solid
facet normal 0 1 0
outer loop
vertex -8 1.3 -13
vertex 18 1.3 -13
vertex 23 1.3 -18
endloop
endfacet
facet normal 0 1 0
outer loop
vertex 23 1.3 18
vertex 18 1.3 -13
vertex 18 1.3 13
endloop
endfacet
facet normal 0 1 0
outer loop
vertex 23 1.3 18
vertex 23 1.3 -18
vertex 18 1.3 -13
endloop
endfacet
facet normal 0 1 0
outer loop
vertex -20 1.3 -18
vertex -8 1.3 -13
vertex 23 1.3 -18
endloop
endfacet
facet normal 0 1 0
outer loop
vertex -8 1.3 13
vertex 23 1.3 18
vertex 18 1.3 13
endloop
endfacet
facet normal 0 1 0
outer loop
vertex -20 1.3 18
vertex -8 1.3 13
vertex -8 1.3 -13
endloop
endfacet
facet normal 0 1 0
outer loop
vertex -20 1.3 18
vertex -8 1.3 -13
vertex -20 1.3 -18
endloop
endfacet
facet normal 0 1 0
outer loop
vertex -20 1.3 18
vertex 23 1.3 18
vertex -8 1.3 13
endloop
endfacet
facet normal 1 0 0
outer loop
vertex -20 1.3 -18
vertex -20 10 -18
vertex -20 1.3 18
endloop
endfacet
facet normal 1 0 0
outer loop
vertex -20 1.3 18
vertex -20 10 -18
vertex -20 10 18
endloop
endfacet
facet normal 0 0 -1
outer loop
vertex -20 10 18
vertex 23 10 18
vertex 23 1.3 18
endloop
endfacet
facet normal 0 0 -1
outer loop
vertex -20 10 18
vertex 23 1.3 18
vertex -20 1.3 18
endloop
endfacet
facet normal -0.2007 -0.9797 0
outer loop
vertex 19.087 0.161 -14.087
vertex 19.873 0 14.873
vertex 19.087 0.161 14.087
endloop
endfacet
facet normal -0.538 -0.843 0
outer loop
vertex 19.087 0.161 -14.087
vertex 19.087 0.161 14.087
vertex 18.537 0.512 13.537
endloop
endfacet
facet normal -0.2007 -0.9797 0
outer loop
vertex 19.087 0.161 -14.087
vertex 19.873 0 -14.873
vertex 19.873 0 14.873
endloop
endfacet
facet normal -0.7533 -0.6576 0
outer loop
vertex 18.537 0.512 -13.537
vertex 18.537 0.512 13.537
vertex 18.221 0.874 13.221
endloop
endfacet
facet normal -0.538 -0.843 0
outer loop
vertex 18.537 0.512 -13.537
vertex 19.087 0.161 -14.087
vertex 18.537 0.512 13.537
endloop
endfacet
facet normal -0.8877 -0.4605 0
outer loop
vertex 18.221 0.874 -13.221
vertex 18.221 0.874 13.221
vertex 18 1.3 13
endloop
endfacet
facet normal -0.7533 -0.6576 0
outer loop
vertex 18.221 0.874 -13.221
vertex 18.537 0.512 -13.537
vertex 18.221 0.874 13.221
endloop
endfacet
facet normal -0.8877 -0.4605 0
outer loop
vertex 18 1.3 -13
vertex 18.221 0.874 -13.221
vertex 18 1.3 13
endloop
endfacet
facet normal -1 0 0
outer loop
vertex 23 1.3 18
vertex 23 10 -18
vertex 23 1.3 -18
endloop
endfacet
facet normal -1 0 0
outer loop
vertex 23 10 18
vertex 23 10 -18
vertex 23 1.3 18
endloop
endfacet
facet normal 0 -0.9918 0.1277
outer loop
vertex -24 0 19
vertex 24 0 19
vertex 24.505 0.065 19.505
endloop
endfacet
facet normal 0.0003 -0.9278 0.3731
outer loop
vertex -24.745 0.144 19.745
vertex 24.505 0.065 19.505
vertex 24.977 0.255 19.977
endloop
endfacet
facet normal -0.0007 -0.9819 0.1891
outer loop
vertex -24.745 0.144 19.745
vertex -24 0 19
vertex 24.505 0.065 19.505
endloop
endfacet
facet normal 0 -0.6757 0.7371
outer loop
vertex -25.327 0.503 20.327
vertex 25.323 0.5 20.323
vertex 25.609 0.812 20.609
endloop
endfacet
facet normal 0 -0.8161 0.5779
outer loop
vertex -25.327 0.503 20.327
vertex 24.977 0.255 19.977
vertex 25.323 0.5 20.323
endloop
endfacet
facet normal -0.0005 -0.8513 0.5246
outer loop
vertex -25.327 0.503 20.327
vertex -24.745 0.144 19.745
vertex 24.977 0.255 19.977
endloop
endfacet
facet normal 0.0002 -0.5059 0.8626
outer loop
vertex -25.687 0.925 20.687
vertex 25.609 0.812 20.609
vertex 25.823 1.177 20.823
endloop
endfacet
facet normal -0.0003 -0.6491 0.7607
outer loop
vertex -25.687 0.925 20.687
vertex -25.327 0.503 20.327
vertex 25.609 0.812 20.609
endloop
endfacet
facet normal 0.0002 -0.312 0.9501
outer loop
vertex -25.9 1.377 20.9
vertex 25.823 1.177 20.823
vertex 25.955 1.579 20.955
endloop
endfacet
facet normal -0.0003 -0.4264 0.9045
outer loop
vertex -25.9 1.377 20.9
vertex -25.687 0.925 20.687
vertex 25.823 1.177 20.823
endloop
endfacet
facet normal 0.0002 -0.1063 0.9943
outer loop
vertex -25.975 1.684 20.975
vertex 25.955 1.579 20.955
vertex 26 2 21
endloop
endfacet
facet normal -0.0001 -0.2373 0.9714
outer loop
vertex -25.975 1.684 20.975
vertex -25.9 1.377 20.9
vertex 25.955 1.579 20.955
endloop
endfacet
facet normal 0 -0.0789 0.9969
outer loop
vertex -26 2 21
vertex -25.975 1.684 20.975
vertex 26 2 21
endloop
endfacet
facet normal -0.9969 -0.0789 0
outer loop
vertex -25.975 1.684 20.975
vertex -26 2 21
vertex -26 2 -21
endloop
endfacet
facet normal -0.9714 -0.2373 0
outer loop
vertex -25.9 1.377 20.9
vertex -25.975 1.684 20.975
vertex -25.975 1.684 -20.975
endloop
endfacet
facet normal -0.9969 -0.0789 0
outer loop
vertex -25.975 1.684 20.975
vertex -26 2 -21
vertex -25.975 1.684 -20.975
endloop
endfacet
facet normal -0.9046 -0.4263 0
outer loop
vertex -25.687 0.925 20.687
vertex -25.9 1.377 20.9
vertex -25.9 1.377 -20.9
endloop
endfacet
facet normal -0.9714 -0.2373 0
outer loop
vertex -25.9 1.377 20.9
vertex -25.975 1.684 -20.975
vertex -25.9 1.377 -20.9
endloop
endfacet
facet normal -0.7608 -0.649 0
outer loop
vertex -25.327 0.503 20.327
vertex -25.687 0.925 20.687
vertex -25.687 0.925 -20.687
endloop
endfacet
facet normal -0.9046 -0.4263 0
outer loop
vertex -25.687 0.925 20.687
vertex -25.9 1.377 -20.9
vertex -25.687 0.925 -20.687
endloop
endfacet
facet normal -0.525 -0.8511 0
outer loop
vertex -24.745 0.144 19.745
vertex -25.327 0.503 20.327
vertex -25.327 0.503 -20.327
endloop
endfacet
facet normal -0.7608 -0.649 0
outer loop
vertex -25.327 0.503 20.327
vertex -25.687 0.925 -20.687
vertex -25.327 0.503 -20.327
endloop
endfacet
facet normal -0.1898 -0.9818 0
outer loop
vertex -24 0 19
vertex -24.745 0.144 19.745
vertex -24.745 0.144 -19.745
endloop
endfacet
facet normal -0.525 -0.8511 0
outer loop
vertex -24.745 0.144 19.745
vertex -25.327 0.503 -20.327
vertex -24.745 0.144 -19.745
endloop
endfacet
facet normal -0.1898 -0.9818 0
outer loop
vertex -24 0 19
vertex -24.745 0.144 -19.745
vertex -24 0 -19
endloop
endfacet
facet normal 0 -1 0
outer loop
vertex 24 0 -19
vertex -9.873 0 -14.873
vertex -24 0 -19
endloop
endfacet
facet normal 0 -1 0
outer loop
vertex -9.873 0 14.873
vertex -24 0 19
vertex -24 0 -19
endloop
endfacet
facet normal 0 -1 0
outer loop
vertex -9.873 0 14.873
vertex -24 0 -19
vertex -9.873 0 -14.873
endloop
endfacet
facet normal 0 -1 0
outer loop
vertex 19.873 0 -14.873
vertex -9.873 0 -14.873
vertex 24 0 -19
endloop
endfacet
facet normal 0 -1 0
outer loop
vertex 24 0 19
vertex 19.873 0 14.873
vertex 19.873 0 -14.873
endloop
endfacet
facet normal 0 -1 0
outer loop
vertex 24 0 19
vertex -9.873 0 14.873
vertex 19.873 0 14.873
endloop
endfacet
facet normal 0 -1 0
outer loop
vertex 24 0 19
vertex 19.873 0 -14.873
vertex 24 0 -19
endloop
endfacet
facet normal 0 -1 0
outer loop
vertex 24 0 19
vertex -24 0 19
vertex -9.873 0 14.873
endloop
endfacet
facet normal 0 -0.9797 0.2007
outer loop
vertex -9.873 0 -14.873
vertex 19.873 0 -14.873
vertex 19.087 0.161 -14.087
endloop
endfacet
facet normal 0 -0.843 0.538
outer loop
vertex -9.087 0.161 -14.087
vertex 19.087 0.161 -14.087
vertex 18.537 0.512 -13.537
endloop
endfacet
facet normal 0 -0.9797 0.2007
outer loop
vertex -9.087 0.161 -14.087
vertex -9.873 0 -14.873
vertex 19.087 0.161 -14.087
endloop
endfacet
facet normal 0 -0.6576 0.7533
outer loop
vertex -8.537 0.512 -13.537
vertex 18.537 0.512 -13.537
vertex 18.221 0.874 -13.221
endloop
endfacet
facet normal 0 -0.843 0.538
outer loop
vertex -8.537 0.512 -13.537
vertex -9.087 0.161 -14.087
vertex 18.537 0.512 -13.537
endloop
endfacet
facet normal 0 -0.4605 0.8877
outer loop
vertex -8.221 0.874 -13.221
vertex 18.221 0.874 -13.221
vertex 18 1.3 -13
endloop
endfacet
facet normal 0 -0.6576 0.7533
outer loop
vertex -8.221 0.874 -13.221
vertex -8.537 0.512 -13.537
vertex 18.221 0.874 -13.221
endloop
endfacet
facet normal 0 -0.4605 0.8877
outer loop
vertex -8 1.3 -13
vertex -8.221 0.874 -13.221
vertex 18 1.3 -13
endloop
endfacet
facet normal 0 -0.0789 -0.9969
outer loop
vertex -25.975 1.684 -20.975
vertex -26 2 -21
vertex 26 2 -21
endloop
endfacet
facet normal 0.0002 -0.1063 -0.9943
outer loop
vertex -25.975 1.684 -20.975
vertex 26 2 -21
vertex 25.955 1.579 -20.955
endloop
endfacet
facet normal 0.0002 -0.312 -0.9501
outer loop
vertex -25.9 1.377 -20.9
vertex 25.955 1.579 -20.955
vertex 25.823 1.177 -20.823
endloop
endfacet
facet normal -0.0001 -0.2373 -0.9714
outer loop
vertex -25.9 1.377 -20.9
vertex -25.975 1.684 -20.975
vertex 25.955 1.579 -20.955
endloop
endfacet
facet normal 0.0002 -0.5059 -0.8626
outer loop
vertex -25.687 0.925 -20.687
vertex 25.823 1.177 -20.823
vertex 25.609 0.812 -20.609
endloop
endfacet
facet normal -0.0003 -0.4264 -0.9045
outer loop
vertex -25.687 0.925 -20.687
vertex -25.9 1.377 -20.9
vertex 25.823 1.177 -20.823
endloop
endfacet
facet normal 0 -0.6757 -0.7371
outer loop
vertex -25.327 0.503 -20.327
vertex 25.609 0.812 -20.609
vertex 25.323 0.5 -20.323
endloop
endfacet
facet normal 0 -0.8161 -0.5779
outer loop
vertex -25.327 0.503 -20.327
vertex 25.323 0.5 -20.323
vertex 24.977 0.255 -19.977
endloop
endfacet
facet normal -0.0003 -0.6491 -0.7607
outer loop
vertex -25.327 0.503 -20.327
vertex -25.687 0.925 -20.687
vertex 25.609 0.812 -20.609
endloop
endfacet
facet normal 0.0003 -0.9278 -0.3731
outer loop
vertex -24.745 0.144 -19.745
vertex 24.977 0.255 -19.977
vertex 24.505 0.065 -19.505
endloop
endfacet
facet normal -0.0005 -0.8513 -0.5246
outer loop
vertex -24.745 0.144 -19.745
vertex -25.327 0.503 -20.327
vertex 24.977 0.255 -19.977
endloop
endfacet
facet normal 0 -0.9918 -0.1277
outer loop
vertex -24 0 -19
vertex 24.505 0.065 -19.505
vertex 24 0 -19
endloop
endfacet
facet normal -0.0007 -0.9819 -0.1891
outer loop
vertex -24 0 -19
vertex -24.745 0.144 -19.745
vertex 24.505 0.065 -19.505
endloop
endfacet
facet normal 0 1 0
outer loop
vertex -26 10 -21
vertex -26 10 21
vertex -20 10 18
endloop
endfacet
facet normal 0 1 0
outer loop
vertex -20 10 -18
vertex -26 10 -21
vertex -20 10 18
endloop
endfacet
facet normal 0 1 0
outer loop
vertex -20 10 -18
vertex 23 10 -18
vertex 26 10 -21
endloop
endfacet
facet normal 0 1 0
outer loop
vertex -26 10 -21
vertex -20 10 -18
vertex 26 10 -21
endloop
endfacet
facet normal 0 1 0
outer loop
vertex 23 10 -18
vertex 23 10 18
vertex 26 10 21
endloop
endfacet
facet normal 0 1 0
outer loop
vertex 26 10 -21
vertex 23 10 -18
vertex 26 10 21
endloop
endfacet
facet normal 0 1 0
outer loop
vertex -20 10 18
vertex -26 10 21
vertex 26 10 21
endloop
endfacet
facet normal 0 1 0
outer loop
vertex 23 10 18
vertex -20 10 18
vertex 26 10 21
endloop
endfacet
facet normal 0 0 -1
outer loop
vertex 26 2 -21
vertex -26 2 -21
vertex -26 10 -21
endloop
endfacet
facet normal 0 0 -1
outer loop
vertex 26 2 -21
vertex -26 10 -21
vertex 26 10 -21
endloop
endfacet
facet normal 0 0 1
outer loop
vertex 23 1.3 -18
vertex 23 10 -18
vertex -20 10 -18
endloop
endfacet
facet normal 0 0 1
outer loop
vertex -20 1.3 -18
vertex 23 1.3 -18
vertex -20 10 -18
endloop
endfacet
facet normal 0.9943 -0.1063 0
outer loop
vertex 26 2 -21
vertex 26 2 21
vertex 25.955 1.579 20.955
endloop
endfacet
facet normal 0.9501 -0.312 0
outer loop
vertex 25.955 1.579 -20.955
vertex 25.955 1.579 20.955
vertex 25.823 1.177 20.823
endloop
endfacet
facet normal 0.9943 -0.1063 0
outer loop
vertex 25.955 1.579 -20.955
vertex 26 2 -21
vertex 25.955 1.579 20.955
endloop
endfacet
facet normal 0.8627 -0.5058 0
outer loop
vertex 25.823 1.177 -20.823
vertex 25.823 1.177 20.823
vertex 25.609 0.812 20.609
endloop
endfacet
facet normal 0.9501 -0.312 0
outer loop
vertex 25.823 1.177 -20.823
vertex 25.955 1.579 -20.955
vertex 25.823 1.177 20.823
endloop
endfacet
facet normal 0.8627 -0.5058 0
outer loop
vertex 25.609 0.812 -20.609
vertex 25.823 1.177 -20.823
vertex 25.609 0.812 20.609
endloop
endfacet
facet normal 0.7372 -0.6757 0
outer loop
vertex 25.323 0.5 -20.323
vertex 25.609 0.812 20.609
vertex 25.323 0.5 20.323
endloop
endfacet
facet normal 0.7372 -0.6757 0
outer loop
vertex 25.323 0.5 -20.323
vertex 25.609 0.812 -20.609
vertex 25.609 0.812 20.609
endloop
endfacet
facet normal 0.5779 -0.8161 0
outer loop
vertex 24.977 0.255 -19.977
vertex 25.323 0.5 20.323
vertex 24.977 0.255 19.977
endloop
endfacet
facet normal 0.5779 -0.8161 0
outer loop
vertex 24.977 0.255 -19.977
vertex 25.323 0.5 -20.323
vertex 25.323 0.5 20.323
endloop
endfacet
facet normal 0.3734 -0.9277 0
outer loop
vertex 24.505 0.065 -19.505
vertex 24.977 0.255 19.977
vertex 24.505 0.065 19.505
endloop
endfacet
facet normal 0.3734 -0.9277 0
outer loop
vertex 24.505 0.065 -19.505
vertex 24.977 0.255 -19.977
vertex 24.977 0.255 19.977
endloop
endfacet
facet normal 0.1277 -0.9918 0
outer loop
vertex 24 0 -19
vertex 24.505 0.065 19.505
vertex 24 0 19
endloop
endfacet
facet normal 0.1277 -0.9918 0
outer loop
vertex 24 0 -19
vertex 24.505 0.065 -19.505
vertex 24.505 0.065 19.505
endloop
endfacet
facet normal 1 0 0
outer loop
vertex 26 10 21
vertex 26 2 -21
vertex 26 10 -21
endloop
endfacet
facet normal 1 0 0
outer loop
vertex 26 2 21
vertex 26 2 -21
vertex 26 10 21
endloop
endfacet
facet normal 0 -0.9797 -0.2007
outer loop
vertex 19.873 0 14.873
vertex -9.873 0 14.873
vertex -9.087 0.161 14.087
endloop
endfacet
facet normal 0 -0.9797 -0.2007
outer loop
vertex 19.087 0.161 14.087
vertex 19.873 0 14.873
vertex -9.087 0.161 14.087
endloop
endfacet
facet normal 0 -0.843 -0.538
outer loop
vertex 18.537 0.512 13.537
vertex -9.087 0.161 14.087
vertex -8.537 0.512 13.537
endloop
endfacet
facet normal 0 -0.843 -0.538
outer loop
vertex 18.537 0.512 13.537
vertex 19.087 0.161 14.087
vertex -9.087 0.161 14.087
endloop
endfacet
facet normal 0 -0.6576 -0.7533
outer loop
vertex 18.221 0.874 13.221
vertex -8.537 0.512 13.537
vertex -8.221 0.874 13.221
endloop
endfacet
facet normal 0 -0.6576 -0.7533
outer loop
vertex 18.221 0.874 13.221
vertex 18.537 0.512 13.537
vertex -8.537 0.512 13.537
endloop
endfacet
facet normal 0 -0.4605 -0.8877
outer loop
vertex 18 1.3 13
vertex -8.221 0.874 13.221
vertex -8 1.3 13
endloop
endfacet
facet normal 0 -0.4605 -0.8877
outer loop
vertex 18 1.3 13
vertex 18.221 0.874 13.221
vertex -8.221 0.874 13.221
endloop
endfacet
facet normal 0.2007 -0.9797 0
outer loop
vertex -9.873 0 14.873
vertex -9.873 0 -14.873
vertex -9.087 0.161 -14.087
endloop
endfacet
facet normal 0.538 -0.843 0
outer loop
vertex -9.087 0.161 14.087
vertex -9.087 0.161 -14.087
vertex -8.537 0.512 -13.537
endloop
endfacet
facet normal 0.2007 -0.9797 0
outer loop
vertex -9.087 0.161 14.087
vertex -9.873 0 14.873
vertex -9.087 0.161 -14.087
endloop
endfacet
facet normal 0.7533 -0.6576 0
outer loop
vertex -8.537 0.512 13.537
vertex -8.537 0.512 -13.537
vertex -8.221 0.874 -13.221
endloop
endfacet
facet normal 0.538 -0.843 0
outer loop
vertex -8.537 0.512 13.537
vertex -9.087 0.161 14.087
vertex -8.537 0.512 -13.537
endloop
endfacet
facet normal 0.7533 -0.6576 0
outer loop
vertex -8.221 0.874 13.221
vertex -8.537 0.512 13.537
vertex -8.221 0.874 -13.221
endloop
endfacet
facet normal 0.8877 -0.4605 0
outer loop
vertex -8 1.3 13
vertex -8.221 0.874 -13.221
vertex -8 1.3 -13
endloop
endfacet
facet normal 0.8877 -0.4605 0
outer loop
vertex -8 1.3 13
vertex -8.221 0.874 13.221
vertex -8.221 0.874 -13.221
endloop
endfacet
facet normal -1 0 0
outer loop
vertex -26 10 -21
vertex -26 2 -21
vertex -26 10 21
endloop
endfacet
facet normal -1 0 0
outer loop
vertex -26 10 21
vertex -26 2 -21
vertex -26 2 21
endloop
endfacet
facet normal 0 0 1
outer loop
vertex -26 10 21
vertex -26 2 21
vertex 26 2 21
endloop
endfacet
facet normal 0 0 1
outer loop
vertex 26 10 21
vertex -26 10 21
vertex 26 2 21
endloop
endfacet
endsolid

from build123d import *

# Parameters (mm, degrees)
F0_W         = 52
F0_H         = 42
F1_DEPTH     = 10
F2_W         = 26
F2_H         = 26
F3_DEPTH     = 25
F4_W         = 43
F4_H         = 36
F4_W_2       = 26
F4_H_2       = 26
F5_DEPTH     = 8.7
F6_T1_DEPTH  = 52
F6_T3_DEPTH  = 62
F6_T5_DEPTH  = 26
F6_T7_DEPTH  = 26
F6_T13_DEPTH = 30.6837484988
F6_T17_DEPTH = 30.6837484988
F6_T24_DEPTH = 30.6837484988
F6_T28_DEPTH = 30.6837484988
F6_T35_DEPTH = 30.6837484988
F6_T39_DEPTH = 30.6837484988
F6_T46_DEPTH = 30.6837484988
F6_T50_DEPTH = 30.6837484988


# Not quite as in the source:
# - a fillet or chamfer that OpenCascade refuses, or shapes differently, is made with other operations: its cross-section is extruded or revolved along the edge and cut away or added


with BuildPart() as f1:
    # F0 (on Front) → F1 (new body)
    with BuildSketch(Plane.XZ):
        Rectangle(F0_W, F0_H)
    extrude(amount=-F1_DEPTH)

    # F2 (on face) → F3 (cut)
    with BuildSketch(Plane.XZ):
        with Locations((5, 0)):
            Rectangle(F2_W, F2_H)
    extrude(amount=-F3_DEPTH, mode=Mode.SUBTRACT)

    # F4 (on face) → F5 (cut)
    with BuildSketch(Plane(origin=(0, 10, 0), x_dir=(-1, 0, 0), z_dir=(0, 1, 0))):
        with Locations((-1.5, 0)):
            Rectangle(F4_W, F4_H)
        with Locations((-5, 0)):
            Rectangle(F4_W_2, F4_H_2, mode=Mode.SUBTRACT)
    extrude(amount=-F5_DEPTH, mode=Mode.SUBTRACT)

    # F6: fillet of radius 2 on 8 edges, made by hand

    # F6_s2 → F6_t1 (cut)
    with BuildSketch(Plane.XY.offset(-26)):
        with BuildLine():
            ThreePointArc((-26, 2), (-25.4142135624, 0.5857864376), (-24, 0))
            Line((-24, 0), (-26, 0))
            Line((-26, 0), (-26, 2))
        make_face()
        with BuildLine():
            ThreePointArc((26, 2), (25.4142135624, 0.5857864376), (24, 0))
            Line((24, 0), (26, 0))
            Line((26, 0), (26, 2))
        make_face()
    extrude(amount=F6_T1_DEPTH, mode=Mode.SUBTRACT)

    # F6_s4 → F6_t3 (cut)
    with BuildSketch(Plane.YZ.offset(-31)):
        with BuildLine():
            ThreePointArc((0, 19), (0.5857864376, 20.4142135624), (2, 21))
            Line((2, 21), (0, 21))
            Line((0, 21), (0, 19))
        make_face()
        with BuildLine():
            ThreePointArc((2, -21), (0.5857864376, -20.4142135624), (0, -19))
            Line((0, -19), (0, -21))
            Line((0, -21), (2, -21))
        make_face()
    extrude(amount=F6_T3_DEPTH, mode=Mode.SUBTRACT)

    # F6_s6 → F6_t5 (cut)
    with BuildSketch(Plane.XY.offset(-13)):
        with BuildLine():
            ThreePointArc((-9.8734993995, 0), (-8.7333239744, 0.3568323275), (-8, 1.3))
            Line((-8, 1.3), (-8, 0))
            Line((-8, 0), (-9.8734993995, 0))
        make_face()
        with BuildLine():
            ThreePointArc((19.8734993995, 0), (18.7333239744, 0.3568323275), (18, 1.3))
            Line((18, 1.3), (18, 0))
            Line((18, 0), (19.8734993995, 0))
        make_face()
    extrude(amount=F6_T5_DEPTH, mode=Mode.SUBTRACT)

    # F6_s8 → F6_t7 (cut)
    with BuildSketch(Plane.YZ.offset(-8)):
        with BuildLine():
            ThreePointArc((0, -14.8734993995), (0.3568323275, -13.7333239744), (1.3, -13))
            Line((1.3, -13), (0, -13))
            Line((0, -13), (0, -14.8734993995))
        make_face()
        with BuildLine():
            ThreePointArc((0, 14.8734993995), (0.3568323275, 13.7333239744), (1.3, 13))
            Line((1.3, 13), (0, 13))
            Line((0, 13), (0, 14.8734993995))
        make_face()
    extrude(amount=F6_T7_DEPTH, mode=Mode.SUBTRACT)


with BuildPart() as f6_tool11:
    # F6_s12 → F6_t13 (new body)
    with BuildSketch(Plane.YZ.offset(18)):
        with BuildLine():
            ThreePointArc((0, 14.8734993995), (0.3568323275, 13.7333239744), (1.3, 13))
            Line((1.3, 13), (0, 13))
            Line((0, 13), (0, 14.8734993995))
        make_face()
    extrude(amount=-F6_T13_DEPTH)

    split(bisect_by=Plane.YZ.offset(-8), keep=Keep.BOTTOM)


with BuildPart() as f6_tool15:
    # F6_s16 → F6_t17 (new body)
    with BuildSketch(Plane.XY.offset(17.6837484988)):
        with BuildLine():
            ThreePointArc((-9.8734993995, 0), (-8.7333239744, 0.3568323275), (-8, 1.3))
            Line((-8, 1.3), (-8, 0))
            Line((-8, 0), (-9.8734993995, 0))
        make_face()
    extrude(amount=-F6_T17_DEPTH)

    split(bisect_by=Plane.XY.offset(13), keep=Keep.TOP)


with BuildPart() as f6_tool11_1:
    add(f6_tool11.part)

    # F6_t19: intersect F6_tool15
    add(f6_tool15.part, mode=Mode.INTERSECT)


with BuildPart() as f1_1:
    add(f1.part)

    # F6_t9: cut F6_tool11
    add(f6_tool11_1.part, mode=Mode.SUBTRACT)


with BuildPart() as f6_tool22:
    # F6_s23 → F6_t24 (new body)
    with BuildSketch(Plane.XY.offset(13)):
        with BuildLine():
            ThreePointArc((-9.8734993995, 0), (-8.7333239744, 0.3568323275), (-8, 1.3))
            Line((-8, 1.3), (-8, 0))
            Line((-8, 0), (-9.8734993995, 0))
        make_face()
    extrude(amount=-F6_T24_DEPTH)

    split(bisect_by=Plane.XY.offset(-13), keep=Keep.BOTTOM)


with BuildPart() as f6_tool26:
    # F6_s27 → F6_t28 (new body)
    with BuildSketch(Plane.YZ.offset(-12.6837484988)):
        with BuildLine():
            ThreePointArc((0, -14.8734993995), (0.3568323275, -13.7333239744), (1.3, -13))
            Line((1.3, -13), (0, -13))
            Line((0, -13), (0, -14.8734993995))
        make_face()
    extrude(amount=F6_T28_DEPTH)

    split(bisect_by=Plane.YZ.offset(-8), keep=Keep.BOTTOM)


with BuildPart() as f6_tool22_1:
    add(f6_tool22.part)

    # F6_t30: intersect F6_tool26
    add(f6_tool26.part, mode=Mode.INTERSECT)


with BuildPart() as f1_2:
    add(f1_1.part)

    # F6_t20: cut F6_tool22
    add(f6_tool22_1.part, mode=Mode.SUBTRACT)


with BuildPart() as f6_tool33:
    # F6_s34 → F6_t35 (new body)
    with BuildSketch(Plane.XY.offset(-17.6837484988)):
        with BuildLine():
            ThreePointArc((19.8734993995, 0), (18.7333239744, 0.3568323275), (18, 1.3))
            Line((18, 1.3), (18, 0))
            Line((18, 0), (19.8734993995, 0))
        make_face()
    extrude(amount=F6_T35_DEPTH)

    split(bisect_by=Plane.XY.offset(-13), keep=Keep.BOTTOM)


with BuildPart() as f6_tool37:
    # F6_s38 → F6_t39 (new body)
    with BuildSketch(Plane.YZ.offset(-8)):
        with BuildLine():
            ThreePointArc((0, -14.8734993995), (0.3568323275, -13.7333239744), (1.3, -13))
            Line((1.3, -13), (0, -13))
            Line((0, -13), (0, -14.8734993995))
        make_face()
    extrude(amount=F6_T39_DEPTH)

    split(bisect_by=Plane.YZ.offset(18), keep=Keep.TOP)


with BuildPart() as f6_tool33_1:
    add(f6_tool33.part)

    # F6_t41: intersect F6_tool37
    add(f6_tool37.part, mode=Mode.INTERSECT)


with BuildPart() as f1_3:
    add(f1_2.part)

    # F6_t31: cut F6_tool33
    add(f6_tool33_1.part, mode=Mode.SUBTRACT)


with BuildPart() as f6_tool44:
    # F6_s45 → F6_t46 (new body)
    with BuildSketch(Plane.XY.offset(-13)):
        with BuildLine():
            ThreePointArc((19.8734993995, 0), (18.7333239744, 0.3568323275), (18, 1.3))
            Line((18, 1.3), (18, 0))
            Line((18, 0), (19.8734993995, 0))
        make_face()
    extrude(amount=F6_T46_DEPTH)

    split(bisect_by=Plane.XY.offset(13), keep=Keep.TOP)


with BuildPart() as f6_tool48:
    # F6_s49 → F6_t50 (new body)
    with BuildSketch(Plane.YZ.offset(22.6837484988)):
        with BuildLine():
            ThreePointArc((0, 14.8734993995), (0.3568323275, 13.7333239744), (1.3, 13))
            Line((1.3, 13), (0, 13))
            Line((0, 13), (0, 14.8734993995))
        make_face()
    extrude(amount=-F6_T50_DEPTH)

    split(bisect_by=Plane.YZ.offset(18), keep=Keep.TOP)


with BuildPart() as f6_tool44_1:
    add(f6_tool44.part)

    # F6_t52: intersect F6_tool48
    add(f6_tool48.part, mode=Mode.INTERSECT)


with BuildPart() as f1_4:
    add(f1_3.part)

    # F6_t42: cut F6_tool44
    add(f6_tool44_1.part, mode=Mode.SUBTRACT)


solid = f1_4.part
